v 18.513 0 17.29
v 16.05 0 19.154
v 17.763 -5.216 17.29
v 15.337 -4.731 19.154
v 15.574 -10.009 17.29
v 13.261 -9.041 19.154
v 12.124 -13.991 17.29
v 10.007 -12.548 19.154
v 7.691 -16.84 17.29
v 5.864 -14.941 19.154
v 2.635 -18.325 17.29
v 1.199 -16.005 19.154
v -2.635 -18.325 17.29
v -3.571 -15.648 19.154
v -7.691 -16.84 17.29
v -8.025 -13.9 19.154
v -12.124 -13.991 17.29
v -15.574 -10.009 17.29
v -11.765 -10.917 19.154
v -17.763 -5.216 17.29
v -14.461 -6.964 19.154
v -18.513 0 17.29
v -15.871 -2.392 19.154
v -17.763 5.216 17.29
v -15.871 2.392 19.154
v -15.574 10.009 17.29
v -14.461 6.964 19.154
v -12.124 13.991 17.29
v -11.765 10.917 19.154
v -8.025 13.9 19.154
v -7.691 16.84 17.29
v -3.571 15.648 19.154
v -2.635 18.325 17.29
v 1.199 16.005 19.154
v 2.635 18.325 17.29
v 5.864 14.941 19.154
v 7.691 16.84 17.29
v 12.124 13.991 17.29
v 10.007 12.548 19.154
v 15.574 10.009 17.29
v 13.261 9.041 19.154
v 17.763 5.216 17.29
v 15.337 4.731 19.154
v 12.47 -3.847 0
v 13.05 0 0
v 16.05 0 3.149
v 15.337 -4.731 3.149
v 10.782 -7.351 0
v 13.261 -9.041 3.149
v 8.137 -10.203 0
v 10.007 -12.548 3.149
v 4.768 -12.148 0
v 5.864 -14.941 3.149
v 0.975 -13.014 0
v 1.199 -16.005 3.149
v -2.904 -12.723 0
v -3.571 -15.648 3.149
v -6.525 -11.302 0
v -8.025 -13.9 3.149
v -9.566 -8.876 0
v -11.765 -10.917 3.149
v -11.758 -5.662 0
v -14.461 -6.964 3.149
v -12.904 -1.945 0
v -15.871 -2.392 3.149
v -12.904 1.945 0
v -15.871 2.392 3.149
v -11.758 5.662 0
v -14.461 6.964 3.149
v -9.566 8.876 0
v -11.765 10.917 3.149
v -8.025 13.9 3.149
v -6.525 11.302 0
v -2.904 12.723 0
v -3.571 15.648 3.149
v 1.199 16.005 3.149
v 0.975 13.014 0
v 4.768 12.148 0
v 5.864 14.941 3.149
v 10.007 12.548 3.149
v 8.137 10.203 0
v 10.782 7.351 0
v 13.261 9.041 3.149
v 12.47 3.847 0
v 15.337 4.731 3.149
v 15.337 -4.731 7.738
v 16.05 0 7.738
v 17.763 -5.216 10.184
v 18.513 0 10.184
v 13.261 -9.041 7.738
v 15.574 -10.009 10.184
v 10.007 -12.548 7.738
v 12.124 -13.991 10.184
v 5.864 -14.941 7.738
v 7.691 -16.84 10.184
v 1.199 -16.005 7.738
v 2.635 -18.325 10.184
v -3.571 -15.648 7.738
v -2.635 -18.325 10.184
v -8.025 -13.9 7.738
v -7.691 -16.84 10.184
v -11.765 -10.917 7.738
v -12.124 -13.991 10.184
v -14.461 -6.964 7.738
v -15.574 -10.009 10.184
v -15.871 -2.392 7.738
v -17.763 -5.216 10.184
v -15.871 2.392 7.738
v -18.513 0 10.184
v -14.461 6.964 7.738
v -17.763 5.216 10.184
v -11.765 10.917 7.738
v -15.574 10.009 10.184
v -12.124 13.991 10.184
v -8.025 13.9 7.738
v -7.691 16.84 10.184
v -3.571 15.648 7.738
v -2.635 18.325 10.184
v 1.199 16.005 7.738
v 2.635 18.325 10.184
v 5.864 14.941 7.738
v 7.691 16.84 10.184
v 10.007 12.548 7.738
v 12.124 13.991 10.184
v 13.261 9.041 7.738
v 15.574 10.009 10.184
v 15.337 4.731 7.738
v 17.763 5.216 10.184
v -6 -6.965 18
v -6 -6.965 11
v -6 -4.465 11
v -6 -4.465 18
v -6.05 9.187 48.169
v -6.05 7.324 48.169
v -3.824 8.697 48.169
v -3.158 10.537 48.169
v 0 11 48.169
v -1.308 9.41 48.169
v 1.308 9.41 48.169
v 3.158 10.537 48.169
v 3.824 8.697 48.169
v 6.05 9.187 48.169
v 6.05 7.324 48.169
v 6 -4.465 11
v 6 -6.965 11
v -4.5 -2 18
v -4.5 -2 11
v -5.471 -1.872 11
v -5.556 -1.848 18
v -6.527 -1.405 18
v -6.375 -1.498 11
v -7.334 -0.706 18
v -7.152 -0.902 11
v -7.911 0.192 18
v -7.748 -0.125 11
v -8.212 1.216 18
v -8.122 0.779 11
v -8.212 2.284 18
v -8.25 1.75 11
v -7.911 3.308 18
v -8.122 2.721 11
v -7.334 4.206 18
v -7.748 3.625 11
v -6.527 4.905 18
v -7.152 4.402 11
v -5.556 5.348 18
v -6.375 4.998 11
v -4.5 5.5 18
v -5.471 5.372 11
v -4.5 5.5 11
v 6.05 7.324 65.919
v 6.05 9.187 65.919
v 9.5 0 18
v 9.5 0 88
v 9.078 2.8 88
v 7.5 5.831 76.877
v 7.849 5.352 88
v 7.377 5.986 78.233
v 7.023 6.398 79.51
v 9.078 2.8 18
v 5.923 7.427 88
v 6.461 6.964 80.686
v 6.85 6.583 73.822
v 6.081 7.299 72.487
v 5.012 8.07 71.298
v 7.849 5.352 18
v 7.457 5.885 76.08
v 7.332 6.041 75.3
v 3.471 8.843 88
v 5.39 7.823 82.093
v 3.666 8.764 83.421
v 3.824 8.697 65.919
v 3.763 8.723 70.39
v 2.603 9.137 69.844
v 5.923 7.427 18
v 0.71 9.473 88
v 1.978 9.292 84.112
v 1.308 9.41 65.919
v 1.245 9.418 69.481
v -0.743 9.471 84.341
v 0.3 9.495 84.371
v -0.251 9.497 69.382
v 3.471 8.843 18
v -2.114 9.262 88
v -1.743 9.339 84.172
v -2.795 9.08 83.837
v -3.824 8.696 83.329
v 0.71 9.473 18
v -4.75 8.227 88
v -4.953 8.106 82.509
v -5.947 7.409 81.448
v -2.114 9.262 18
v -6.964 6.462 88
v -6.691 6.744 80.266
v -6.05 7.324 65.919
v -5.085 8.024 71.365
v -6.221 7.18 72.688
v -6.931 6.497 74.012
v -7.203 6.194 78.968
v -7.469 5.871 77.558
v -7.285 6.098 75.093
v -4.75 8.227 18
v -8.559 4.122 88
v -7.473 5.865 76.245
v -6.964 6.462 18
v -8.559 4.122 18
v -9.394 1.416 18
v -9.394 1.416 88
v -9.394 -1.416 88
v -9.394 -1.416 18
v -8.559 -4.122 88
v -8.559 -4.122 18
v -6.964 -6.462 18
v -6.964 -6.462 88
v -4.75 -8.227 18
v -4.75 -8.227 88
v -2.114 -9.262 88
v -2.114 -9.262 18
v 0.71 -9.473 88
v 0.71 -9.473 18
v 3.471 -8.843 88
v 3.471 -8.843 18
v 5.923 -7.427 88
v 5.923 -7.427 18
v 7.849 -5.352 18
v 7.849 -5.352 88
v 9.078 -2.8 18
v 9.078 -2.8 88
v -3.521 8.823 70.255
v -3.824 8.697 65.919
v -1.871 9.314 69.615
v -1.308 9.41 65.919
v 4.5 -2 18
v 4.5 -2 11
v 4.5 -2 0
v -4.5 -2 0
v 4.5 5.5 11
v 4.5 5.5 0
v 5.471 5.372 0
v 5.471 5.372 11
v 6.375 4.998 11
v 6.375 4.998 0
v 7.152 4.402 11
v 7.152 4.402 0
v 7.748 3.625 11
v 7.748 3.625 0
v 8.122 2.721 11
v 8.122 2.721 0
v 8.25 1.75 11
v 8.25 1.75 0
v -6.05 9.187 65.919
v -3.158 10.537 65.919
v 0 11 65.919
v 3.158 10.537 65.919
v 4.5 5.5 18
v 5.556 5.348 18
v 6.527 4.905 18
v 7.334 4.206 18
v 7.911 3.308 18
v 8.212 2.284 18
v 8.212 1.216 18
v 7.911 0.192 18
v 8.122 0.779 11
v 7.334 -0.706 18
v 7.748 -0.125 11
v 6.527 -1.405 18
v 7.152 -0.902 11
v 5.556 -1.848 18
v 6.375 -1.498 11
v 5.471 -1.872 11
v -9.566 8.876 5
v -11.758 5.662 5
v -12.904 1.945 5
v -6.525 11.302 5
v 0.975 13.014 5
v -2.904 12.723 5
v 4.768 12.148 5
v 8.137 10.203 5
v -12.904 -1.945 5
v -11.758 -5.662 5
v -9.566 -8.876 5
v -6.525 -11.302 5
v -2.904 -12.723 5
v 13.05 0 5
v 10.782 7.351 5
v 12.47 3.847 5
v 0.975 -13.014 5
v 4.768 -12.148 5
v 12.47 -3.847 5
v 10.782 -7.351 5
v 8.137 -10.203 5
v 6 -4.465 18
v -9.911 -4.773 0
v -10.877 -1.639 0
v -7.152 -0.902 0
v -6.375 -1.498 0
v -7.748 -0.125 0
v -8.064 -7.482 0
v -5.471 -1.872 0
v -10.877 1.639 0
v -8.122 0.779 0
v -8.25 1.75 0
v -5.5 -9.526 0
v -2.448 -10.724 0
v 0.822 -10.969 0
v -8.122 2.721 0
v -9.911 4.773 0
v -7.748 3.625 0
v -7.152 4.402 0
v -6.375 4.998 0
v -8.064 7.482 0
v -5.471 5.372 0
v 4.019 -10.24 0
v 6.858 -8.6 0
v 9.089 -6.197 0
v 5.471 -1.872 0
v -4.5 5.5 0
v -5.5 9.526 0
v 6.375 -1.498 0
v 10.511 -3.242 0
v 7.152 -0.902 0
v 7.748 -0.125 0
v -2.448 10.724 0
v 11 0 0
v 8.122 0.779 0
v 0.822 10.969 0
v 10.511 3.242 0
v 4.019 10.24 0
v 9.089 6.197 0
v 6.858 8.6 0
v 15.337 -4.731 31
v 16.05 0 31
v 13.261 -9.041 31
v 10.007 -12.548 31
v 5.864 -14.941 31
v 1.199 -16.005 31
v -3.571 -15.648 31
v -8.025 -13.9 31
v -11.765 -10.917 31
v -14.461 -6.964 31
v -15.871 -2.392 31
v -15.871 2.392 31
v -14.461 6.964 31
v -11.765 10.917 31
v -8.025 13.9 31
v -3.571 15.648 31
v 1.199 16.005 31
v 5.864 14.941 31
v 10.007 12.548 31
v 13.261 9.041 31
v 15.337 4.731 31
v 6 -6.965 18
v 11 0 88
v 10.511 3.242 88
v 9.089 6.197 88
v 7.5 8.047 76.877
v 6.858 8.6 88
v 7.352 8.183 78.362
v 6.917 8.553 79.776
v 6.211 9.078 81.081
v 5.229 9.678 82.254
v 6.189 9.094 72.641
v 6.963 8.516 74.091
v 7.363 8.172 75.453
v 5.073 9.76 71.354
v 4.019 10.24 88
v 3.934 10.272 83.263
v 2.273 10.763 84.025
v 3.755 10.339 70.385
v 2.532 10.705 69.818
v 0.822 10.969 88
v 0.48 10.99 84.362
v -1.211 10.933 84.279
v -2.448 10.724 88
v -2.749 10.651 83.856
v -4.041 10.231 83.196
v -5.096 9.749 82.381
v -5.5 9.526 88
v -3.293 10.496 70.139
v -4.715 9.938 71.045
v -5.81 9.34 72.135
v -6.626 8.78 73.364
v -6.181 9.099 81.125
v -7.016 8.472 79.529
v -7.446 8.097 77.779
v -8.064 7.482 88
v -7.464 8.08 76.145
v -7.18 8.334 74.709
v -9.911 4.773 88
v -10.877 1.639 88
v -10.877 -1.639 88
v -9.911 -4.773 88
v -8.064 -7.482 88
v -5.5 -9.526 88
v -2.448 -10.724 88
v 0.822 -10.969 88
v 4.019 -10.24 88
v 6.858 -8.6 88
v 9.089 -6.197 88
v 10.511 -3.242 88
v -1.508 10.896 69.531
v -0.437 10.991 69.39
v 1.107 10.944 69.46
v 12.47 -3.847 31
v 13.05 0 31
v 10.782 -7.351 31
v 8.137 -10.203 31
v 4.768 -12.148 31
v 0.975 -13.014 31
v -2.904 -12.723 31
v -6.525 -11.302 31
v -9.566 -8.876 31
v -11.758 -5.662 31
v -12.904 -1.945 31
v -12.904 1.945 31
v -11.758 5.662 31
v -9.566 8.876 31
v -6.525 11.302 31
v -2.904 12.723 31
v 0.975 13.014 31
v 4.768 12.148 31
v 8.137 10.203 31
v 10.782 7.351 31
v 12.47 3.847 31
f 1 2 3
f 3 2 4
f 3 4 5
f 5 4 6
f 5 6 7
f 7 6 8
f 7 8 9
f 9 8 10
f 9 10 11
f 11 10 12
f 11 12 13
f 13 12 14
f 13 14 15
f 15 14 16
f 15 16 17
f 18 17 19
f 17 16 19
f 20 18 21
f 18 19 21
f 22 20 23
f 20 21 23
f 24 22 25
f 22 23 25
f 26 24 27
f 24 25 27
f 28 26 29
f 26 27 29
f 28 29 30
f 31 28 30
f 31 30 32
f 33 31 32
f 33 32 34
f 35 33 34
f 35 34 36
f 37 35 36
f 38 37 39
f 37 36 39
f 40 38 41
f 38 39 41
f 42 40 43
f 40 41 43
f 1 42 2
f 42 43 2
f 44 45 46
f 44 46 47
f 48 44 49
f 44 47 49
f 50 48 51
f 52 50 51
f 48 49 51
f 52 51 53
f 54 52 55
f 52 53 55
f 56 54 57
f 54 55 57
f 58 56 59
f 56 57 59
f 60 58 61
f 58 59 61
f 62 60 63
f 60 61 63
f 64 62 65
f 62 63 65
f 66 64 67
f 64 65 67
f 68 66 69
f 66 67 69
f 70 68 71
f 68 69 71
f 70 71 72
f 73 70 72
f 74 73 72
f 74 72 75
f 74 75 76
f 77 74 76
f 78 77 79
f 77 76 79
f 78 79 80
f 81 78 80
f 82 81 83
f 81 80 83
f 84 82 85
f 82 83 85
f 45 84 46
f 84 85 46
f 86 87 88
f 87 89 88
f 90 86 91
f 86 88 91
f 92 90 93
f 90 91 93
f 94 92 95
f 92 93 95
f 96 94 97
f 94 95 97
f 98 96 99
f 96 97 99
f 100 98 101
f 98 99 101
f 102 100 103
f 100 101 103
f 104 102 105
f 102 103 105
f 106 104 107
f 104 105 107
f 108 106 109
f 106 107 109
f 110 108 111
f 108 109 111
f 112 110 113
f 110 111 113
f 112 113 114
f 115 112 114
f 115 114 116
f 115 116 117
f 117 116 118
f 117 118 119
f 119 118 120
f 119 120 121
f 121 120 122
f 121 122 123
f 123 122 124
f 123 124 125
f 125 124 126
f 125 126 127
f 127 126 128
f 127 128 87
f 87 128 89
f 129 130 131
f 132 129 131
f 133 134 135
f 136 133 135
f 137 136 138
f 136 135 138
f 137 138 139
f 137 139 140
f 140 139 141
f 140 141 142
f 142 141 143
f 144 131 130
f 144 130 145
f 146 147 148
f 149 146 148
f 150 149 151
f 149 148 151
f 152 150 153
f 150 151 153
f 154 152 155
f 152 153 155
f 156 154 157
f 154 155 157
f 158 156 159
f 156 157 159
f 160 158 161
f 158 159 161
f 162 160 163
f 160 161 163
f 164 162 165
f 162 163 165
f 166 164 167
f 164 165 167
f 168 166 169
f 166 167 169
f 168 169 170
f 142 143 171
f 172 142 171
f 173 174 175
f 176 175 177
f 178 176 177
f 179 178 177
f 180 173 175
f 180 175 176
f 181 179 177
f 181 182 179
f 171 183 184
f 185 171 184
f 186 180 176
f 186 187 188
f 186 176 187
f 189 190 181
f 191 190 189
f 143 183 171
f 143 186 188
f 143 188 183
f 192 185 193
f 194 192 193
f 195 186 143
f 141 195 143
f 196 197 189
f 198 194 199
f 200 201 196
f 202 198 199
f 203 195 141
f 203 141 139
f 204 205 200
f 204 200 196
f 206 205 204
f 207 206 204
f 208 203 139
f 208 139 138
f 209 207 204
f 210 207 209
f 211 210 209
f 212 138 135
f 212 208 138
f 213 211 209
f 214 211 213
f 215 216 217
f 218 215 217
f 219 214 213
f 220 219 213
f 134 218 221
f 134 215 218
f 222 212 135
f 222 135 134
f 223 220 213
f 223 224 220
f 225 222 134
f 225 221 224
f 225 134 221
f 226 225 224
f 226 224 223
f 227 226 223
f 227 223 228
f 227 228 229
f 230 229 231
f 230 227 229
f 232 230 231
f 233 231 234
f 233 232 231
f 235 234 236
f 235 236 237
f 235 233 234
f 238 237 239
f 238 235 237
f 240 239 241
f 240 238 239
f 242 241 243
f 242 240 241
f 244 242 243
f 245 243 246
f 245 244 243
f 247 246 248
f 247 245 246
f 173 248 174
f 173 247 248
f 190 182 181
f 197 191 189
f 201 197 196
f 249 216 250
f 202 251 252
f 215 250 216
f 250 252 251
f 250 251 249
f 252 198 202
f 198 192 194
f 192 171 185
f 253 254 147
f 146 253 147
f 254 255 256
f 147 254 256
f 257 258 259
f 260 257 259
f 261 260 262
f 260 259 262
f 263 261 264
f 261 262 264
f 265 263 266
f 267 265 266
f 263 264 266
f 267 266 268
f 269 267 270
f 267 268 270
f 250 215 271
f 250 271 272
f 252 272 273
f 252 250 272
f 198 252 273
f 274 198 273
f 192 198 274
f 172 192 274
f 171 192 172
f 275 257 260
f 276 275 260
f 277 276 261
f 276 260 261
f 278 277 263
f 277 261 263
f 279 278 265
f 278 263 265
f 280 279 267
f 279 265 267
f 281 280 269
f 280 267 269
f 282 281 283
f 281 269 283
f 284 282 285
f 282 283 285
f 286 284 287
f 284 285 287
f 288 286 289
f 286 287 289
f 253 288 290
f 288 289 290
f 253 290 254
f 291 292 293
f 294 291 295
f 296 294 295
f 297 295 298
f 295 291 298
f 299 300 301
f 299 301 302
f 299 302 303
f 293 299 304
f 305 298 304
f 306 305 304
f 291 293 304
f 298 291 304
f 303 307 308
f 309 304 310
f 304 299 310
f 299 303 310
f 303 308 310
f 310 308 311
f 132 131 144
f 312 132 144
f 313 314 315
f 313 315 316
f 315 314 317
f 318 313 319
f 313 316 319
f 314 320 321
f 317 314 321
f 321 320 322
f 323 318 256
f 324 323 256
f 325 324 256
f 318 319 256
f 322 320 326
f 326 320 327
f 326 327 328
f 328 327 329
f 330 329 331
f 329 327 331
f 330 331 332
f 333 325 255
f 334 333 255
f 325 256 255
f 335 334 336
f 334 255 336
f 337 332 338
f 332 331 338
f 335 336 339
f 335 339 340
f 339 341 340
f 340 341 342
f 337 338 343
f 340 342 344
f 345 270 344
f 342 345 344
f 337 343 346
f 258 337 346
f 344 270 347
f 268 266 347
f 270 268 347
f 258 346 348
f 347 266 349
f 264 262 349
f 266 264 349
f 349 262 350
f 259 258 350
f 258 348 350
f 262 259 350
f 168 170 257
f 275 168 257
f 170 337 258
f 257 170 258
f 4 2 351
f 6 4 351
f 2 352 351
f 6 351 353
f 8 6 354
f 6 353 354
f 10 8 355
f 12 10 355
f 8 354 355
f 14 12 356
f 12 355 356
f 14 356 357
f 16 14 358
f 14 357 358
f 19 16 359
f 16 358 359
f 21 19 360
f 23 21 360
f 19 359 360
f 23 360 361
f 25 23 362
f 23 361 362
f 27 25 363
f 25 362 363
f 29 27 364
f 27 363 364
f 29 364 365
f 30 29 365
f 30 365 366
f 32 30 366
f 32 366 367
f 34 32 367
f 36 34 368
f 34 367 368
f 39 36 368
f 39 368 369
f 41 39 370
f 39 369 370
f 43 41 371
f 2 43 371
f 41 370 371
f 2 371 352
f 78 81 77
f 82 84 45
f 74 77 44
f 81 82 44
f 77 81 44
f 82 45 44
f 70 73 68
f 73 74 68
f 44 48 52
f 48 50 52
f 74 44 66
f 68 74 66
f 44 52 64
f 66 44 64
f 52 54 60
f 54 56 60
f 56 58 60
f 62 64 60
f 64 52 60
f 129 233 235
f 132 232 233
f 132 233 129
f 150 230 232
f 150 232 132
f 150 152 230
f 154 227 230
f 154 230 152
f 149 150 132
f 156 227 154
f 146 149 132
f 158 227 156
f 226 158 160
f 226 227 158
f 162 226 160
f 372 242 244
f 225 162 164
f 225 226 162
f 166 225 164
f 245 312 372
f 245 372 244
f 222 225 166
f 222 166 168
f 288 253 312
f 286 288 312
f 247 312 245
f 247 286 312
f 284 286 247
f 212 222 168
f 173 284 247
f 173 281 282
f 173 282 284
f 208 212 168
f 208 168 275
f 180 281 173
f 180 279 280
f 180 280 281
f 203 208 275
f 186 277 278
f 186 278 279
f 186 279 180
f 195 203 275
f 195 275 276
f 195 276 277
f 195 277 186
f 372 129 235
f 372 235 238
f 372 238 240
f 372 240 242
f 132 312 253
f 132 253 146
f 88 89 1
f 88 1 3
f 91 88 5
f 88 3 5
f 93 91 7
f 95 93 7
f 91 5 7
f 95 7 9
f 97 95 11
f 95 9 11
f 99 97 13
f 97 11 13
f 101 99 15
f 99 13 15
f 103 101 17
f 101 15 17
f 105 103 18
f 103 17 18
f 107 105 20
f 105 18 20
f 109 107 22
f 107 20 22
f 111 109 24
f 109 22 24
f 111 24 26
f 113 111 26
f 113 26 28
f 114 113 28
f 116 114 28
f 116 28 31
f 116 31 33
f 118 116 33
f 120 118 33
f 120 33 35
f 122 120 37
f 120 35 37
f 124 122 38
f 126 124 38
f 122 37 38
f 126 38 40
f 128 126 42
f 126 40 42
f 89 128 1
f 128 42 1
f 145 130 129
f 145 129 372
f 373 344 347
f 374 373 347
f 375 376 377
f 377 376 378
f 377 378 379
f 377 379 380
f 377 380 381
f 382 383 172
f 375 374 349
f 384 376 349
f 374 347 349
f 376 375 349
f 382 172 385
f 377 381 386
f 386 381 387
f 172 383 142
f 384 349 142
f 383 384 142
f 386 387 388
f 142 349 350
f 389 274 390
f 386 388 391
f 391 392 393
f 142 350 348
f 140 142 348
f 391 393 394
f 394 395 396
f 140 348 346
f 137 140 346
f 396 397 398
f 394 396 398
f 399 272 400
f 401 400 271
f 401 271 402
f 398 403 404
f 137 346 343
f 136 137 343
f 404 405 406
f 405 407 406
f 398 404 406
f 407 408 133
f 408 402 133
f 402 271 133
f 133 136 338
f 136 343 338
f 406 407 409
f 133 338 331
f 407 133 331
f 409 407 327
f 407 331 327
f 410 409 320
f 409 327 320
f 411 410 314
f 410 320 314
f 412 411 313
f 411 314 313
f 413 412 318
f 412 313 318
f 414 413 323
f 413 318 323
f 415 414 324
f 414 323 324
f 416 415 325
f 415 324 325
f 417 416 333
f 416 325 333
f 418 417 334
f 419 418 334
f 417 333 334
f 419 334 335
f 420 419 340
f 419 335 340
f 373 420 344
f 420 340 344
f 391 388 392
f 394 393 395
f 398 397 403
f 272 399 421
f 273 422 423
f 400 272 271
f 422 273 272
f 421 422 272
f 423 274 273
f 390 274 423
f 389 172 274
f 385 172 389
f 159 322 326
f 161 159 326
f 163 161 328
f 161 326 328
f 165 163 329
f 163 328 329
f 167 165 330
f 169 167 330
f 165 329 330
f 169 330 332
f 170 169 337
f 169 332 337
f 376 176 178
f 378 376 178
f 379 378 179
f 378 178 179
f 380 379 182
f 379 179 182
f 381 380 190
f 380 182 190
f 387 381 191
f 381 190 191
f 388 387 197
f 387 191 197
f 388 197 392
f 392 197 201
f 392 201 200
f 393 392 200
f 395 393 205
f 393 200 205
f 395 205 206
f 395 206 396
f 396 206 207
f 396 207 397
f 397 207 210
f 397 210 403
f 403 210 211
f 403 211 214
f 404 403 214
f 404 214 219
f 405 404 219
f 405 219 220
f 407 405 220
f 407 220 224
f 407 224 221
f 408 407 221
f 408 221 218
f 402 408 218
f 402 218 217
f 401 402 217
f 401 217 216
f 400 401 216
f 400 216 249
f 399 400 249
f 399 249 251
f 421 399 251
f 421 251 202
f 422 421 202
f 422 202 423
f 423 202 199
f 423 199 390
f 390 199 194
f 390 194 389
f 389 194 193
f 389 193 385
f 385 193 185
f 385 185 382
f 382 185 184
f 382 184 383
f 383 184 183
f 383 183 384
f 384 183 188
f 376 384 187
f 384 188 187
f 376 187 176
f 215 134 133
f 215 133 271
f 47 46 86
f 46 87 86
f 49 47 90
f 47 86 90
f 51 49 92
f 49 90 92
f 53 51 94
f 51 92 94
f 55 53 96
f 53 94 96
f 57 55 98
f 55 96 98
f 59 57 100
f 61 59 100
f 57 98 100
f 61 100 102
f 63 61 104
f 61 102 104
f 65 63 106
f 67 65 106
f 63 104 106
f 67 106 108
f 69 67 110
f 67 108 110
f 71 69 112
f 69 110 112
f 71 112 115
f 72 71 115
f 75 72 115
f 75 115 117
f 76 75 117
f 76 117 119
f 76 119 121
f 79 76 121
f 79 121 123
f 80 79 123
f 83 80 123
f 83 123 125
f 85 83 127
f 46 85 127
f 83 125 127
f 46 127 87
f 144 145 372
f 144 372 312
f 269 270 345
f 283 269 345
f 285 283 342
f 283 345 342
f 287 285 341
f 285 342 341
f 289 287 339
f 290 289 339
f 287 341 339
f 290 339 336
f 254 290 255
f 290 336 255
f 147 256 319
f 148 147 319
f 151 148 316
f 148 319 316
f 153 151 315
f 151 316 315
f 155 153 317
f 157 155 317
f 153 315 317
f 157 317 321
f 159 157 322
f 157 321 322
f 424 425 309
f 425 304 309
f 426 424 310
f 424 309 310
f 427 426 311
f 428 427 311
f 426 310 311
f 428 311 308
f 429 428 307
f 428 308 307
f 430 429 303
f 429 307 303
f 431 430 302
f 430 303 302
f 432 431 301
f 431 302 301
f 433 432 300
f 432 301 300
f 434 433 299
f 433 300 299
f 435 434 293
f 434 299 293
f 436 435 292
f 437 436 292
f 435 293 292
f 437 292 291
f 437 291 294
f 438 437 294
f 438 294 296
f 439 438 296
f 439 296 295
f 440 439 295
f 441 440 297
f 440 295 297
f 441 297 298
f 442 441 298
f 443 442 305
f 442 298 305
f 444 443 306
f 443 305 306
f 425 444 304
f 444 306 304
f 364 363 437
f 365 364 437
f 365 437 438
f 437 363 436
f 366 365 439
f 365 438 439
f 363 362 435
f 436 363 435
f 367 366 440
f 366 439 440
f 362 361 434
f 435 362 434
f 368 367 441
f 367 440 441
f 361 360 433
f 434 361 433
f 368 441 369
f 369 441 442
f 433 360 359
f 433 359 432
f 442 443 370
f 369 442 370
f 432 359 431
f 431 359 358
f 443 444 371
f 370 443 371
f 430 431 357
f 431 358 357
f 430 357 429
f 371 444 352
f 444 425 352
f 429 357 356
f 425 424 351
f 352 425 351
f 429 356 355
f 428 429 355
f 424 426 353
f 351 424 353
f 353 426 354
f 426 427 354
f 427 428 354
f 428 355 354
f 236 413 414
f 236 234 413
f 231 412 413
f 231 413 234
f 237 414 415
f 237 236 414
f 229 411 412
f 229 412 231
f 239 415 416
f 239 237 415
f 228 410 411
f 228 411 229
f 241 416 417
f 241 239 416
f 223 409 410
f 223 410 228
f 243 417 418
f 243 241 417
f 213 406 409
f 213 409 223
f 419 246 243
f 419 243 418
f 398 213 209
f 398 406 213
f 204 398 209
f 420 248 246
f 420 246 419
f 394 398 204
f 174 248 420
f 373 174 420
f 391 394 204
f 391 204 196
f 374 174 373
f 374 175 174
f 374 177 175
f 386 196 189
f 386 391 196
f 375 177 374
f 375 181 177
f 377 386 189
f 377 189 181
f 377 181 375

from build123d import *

# Parameters (mm, degrees)
F2_R     = 11
F3_DEPTH = 11
F4_R     = 11
F4_W     = 12
F4_H     = 2.5
F5_DEPTH = 7
F6_R     = 11
F6_R_2   = 9.5
F7_DEPTH = 70
F8_R     = 7.5
F8_W     = 12.1
F8_H     = 17.75
F9_DEPTH = 25


with BuildPart() as f1:
    # F0 (on Front) → F1 (revolve)
    with BuildSketch(Plane.XZ):
        Polygon((0, 5), (0, 0), (13.05, 0), (16.05, 3.1490712427), (16.05, 7.7377450652), (16.05, 19.1541668028), (16.05, 31), (13.05, 31), (13.05, 5), align=None)
        Polygon((16.05, 19.1541668028), (16.05, 7.7377450652), (18.5133777559, 10.1841213182), (18.5133777559, 17.2902606428), align=None)
    revolve(axis=Axis((0, 0, 2.5), (0, 0, -1)))


with BuildPart() as f3:
    # F2 (on Top) → F3 (new body)
    with BuildSketch(Plane.XY):
        Circle(F2_R)
        with BuildLine():
            ThreePointArc((-8.25, 1.75), (-7.1516504294, 4.4016504294), (-4.5, 5.5))
            Line((-4.5, 5.5), (4.5, 5.5))
            ThreePointArc((4.5, 5.5), (7.1516504294, 4.4016504294), (8.25, 1.75))
            ThreePointArc((8.25, 1.75), (7.1516504294, -0.9016504294), (4.5, -2))
            Line((4.5, -2), (-4.5, -2))
            ThreePointArc((-4.5, -2), (-7.1516504294, -0.9016504294), (-8.25, 1.75))
        make_face(mode=Mode.SUBTRACT)
    extrude(amount=F3_DEPTH)

    # F4 (on face) → F5 (join)
    with BuildSketch(Plane.XY.offset(11)):
        Circle(F4_R)
        with Locations((0, -5.7151356898)):
            Rectangle(F4_W, F4_H, mode=Mode.SUBTRACT)
        with BuildLine():
            ThreePointArc((4.5, 5.5), (8.25, 1.75), (4.5, -2))
            Line((4.5, -2), (-4.5, -2))
            ThreePointArc((-4.5, -2), (-8.25, 1.75), (-4.5, 5.5))
            Line((-4.5, 5.5), (4.5, 5.5))
        make_face(mode=Mode.SUBTRACT)
    extrude(amount=F5_DEPTH)

    # F6 (on face) → F7 (join)
    with BuildSketch(Plane.XY.offset(18)):
        Circle(F6_R)
        Circle(F6_R_2, mode=Mode.SUBTRACT)
    extrude(amount=F7_DEPTH)

    # F8 (on Front) → F9 (cut)
    with BuildSketch(Plane.XZ):
        with Locations((0, 76.8774747849)):
            Circle(F8_R)
        with Locations((0, 57.0436033309)):
            Rectangle(F8_W, F8_H)
    extrude(amount=-F9_DEPTH, mode=Mode.SUBTRACT)


solid = Compound([f1.part, f3.part])
